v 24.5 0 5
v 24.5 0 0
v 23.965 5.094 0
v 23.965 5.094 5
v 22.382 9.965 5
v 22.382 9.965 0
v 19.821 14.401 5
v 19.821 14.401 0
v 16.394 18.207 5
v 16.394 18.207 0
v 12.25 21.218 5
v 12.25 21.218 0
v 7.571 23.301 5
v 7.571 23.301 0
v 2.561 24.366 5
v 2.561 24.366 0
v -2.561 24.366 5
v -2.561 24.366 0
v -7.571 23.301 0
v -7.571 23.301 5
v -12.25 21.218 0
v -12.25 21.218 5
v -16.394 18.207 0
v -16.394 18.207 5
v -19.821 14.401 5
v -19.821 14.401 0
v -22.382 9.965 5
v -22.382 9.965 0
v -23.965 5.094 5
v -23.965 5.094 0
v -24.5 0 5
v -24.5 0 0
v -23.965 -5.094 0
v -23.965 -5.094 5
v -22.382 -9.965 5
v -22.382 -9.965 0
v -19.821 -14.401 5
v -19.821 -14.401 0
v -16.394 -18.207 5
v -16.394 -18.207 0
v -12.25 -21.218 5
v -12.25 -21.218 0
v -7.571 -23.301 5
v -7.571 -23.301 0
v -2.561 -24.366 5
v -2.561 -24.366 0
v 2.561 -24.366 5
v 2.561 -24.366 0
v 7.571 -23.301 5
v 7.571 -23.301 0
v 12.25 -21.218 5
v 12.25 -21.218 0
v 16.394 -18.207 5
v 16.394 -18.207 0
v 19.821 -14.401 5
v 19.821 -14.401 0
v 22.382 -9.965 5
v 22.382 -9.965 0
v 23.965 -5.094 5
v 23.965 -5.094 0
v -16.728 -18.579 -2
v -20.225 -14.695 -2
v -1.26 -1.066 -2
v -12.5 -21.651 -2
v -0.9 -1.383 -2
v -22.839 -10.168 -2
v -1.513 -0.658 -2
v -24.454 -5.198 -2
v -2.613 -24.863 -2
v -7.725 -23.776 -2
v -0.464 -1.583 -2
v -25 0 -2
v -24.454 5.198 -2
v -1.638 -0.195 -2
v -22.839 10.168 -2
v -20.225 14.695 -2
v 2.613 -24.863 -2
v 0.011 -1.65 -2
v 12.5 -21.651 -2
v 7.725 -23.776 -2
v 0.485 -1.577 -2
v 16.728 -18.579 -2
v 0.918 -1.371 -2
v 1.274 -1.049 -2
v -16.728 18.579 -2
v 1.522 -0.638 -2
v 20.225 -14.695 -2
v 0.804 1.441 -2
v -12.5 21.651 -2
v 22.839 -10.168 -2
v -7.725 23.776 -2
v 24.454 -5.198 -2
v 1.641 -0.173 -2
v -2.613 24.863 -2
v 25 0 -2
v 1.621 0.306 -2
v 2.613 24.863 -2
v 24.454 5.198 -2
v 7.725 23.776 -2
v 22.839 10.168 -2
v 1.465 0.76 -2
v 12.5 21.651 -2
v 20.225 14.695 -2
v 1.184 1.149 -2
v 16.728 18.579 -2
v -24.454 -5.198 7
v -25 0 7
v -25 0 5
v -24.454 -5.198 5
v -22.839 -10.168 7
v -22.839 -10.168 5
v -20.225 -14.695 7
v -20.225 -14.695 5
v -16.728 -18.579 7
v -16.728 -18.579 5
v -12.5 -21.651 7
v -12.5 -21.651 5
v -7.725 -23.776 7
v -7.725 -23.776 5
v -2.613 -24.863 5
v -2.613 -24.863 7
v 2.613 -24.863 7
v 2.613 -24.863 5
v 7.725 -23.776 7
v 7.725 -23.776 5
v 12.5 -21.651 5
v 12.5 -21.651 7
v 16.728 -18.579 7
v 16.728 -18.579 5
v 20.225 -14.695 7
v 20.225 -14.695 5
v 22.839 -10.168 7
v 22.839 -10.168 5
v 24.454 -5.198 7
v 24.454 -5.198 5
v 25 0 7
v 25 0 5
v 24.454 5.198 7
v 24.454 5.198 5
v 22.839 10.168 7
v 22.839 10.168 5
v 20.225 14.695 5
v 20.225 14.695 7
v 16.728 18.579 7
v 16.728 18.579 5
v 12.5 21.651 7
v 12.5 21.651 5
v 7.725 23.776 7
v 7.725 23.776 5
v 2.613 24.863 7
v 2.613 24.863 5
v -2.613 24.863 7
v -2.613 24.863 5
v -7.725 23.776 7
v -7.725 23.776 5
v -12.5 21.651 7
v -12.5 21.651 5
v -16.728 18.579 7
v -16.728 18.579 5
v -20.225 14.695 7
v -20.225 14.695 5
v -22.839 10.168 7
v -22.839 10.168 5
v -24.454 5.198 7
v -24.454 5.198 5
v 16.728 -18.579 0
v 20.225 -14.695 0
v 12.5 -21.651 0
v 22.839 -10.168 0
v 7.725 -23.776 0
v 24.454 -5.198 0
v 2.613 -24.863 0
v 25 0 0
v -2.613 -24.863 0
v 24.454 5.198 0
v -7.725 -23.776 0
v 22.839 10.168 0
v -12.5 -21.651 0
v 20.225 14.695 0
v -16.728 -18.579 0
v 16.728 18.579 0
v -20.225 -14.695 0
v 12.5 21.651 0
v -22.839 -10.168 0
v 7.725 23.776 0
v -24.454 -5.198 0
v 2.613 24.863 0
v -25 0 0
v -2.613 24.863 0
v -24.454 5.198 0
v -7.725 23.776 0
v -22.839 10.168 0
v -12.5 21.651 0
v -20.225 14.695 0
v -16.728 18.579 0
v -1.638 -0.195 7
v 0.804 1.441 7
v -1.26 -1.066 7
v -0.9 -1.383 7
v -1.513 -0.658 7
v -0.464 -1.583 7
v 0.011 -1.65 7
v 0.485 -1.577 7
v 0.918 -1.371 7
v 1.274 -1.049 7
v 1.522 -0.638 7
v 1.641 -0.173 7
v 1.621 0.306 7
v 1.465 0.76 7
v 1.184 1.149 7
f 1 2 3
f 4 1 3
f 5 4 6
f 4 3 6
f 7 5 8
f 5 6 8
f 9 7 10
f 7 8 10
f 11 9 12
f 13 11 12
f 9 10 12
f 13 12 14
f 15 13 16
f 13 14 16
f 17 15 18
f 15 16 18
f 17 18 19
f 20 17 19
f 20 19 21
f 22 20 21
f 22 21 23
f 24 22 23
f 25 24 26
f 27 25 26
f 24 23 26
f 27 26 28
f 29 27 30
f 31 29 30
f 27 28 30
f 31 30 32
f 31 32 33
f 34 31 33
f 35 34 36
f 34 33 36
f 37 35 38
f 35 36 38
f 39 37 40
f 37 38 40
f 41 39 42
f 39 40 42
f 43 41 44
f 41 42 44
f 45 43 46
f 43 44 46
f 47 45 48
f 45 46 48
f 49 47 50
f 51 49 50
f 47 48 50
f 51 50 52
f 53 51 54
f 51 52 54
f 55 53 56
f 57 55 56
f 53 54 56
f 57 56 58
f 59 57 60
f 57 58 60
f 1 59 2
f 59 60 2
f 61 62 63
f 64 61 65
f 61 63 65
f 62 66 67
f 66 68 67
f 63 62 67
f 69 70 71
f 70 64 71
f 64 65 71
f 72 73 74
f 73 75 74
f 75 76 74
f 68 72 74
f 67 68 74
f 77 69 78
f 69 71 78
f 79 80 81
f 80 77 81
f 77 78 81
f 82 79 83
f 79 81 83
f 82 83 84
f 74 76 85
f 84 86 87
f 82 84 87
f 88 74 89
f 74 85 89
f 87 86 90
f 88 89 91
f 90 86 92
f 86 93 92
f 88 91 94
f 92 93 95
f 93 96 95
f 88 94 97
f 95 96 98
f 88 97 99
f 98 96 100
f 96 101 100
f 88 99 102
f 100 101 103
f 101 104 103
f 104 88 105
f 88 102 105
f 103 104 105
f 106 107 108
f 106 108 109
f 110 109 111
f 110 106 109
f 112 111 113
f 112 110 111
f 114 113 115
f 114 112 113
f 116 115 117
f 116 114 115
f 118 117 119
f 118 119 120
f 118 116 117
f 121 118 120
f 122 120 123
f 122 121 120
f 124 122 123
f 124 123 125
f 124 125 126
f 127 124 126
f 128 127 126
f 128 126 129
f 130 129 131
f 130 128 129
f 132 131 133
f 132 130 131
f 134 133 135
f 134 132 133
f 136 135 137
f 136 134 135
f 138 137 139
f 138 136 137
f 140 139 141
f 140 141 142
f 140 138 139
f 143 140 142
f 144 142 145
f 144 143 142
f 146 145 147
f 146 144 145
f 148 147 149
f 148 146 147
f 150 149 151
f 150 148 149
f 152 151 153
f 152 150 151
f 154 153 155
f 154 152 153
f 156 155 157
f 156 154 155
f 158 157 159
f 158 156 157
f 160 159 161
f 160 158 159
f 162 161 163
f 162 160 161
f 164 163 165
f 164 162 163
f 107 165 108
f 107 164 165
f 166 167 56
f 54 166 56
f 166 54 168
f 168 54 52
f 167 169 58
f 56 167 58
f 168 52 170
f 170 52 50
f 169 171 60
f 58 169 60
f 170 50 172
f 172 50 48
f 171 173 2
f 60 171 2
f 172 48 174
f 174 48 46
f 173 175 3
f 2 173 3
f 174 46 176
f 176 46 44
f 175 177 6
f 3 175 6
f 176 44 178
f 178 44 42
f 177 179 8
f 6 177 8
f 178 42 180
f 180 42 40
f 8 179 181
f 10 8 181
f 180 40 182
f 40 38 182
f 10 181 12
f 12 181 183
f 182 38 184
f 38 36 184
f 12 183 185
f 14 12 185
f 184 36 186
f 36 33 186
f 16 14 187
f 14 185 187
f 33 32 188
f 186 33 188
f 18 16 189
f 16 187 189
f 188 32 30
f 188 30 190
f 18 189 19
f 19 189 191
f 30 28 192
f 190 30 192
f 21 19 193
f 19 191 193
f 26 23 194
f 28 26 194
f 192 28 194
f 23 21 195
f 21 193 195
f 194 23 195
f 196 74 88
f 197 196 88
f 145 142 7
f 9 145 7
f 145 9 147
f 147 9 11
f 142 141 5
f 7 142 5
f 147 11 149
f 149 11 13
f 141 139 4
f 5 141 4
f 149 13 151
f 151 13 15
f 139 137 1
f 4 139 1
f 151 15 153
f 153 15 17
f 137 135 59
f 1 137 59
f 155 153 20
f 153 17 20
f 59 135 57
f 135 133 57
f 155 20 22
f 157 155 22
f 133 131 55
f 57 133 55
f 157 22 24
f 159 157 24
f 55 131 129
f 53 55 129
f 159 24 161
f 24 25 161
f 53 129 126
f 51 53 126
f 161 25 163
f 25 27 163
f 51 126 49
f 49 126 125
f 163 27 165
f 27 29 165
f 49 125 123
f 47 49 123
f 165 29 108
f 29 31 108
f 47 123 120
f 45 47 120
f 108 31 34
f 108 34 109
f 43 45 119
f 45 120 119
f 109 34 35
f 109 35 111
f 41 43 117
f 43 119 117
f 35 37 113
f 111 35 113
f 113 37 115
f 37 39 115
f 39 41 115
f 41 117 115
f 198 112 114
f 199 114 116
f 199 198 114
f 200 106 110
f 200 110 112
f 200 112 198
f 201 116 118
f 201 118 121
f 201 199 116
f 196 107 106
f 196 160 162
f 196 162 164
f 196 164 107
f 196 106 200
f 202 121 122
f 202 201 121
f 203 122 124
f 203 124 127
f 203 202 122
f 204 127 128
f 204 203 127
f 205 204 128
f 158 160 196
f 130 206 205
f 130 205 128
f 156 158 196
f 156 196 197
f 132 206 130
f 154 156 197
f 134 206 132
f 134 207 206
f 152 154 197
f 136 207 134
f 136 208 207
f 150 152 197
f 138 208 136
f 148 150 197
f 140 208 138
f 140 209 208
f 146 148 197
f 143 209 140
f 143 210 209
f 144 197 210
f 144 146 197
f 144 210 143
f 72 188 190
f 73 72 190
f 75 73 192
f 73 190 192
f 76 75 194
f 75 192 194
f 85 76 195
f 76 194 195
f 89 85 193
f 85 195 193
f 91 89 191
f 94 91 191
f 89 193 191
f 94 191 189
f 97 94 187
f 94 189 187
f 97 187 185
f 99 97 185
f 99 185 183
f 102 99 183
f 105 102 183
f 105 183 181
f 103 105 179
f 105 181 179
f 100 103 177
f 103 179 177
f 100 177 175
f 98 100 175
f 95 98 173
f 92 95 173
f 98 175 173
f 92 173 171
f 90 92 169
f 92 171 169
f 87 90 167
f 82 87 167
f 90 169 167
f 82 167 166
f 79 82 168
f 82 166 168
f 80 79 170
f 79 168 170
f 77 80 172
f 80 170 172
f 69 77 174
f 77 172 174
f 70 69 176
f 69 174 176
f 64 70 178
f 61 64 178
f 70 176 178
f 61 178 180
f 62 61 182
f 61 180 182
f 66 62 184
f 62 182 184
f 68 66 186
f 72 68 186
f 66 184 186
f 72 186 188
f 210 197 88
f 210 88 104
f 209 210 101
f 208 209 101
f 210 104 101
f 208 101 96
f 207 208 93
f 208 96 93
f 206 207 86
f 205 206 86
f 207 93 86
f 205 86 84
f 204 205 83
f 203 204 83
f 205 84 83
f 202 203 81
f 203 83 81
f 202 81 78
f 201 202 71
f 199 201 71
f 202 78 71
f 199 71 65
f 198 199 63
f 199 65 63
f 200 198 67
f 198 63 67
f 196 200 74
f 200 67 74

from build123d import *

# Parameters (mm, degrees)
ESQUISSE1_R             = 24.5
BOSS_EXTRU_1_DEPTH      = 5
ESQUISSE2_R             = 25
BOSS_EXTRU_2_DEPTH      = 2
BOSS_EXTRU_4_START      = 2
ESQUISSE5_R             = 25
BOSS_EXTRU_4_DEPTH      = 2
ESQUISSE4_R             = 1.65
ENL_V_MAT_EXTRU_1_DEPTH = 37.482872694
BOSS_EXTRU_5_DEPTH      = 9


with BuildPart() as part:
    # Esquisse1 → Boss.-Extru.1 (new body)
    with BuildSketch(Plane.XY):
        Circle(ESQUISSE1_R)
    extrude(amount=BOSS_EXTRU_1_DEPTH)

    # Esquisse2 → Boss.-Extru.2 (add)
    with BuildSketch(Plane(origin=(0, 0, 0), x_dir=(-1, 0, 0), z_dir=(0, 0, -1))):
        Circle(ESQUISSE2_R)
    extrude(amount=BOSS_EXTRU_2_DEPTH)

    # Esquisse5 → Boss.-Extru.4 (add)
    with BuildSketch(Plane.XY.offset(5).offset(BOSS_EXTRU_4_START)):
        with Locations(Location((0, 0, 0), (0, 0, 180))):
            Circle(ESQUISSE5_R)
    extrude(amount=-BOSS_EXTRU_4_DEPTH)

    # Esquisse4 → Enlèv. mat.-Extru.1 (cut, through all)
    with BuildSketch(Plane(origin=(0, 0, -2), x_dir=(-1, 0, 0), z_dir=(0, 0, -1))):
        Circle(ESQUISSE4_R)
    extrude(amount=-ENL_V_MAT_EXTRU_1_DEPTH, mode=Mode.SUBTRACT)

    # Esquisse6 → Boss.-Extru.5 (add, through all)
    with BuildSketch(Plane.XY.offset(7)):
        with BuildLine():
            Line((-1.638440884, -0.194965301), (0.803526302, 1.441126463))
            ThreePointArc((0.803526302, 1.441126463), (-0.91840604, 1.370777278), (-1.638440884, -0.194965301))
        make_face()
    extrude(amount=-BOSS_EXTRU_5_DEPTH)


solid = part.part
